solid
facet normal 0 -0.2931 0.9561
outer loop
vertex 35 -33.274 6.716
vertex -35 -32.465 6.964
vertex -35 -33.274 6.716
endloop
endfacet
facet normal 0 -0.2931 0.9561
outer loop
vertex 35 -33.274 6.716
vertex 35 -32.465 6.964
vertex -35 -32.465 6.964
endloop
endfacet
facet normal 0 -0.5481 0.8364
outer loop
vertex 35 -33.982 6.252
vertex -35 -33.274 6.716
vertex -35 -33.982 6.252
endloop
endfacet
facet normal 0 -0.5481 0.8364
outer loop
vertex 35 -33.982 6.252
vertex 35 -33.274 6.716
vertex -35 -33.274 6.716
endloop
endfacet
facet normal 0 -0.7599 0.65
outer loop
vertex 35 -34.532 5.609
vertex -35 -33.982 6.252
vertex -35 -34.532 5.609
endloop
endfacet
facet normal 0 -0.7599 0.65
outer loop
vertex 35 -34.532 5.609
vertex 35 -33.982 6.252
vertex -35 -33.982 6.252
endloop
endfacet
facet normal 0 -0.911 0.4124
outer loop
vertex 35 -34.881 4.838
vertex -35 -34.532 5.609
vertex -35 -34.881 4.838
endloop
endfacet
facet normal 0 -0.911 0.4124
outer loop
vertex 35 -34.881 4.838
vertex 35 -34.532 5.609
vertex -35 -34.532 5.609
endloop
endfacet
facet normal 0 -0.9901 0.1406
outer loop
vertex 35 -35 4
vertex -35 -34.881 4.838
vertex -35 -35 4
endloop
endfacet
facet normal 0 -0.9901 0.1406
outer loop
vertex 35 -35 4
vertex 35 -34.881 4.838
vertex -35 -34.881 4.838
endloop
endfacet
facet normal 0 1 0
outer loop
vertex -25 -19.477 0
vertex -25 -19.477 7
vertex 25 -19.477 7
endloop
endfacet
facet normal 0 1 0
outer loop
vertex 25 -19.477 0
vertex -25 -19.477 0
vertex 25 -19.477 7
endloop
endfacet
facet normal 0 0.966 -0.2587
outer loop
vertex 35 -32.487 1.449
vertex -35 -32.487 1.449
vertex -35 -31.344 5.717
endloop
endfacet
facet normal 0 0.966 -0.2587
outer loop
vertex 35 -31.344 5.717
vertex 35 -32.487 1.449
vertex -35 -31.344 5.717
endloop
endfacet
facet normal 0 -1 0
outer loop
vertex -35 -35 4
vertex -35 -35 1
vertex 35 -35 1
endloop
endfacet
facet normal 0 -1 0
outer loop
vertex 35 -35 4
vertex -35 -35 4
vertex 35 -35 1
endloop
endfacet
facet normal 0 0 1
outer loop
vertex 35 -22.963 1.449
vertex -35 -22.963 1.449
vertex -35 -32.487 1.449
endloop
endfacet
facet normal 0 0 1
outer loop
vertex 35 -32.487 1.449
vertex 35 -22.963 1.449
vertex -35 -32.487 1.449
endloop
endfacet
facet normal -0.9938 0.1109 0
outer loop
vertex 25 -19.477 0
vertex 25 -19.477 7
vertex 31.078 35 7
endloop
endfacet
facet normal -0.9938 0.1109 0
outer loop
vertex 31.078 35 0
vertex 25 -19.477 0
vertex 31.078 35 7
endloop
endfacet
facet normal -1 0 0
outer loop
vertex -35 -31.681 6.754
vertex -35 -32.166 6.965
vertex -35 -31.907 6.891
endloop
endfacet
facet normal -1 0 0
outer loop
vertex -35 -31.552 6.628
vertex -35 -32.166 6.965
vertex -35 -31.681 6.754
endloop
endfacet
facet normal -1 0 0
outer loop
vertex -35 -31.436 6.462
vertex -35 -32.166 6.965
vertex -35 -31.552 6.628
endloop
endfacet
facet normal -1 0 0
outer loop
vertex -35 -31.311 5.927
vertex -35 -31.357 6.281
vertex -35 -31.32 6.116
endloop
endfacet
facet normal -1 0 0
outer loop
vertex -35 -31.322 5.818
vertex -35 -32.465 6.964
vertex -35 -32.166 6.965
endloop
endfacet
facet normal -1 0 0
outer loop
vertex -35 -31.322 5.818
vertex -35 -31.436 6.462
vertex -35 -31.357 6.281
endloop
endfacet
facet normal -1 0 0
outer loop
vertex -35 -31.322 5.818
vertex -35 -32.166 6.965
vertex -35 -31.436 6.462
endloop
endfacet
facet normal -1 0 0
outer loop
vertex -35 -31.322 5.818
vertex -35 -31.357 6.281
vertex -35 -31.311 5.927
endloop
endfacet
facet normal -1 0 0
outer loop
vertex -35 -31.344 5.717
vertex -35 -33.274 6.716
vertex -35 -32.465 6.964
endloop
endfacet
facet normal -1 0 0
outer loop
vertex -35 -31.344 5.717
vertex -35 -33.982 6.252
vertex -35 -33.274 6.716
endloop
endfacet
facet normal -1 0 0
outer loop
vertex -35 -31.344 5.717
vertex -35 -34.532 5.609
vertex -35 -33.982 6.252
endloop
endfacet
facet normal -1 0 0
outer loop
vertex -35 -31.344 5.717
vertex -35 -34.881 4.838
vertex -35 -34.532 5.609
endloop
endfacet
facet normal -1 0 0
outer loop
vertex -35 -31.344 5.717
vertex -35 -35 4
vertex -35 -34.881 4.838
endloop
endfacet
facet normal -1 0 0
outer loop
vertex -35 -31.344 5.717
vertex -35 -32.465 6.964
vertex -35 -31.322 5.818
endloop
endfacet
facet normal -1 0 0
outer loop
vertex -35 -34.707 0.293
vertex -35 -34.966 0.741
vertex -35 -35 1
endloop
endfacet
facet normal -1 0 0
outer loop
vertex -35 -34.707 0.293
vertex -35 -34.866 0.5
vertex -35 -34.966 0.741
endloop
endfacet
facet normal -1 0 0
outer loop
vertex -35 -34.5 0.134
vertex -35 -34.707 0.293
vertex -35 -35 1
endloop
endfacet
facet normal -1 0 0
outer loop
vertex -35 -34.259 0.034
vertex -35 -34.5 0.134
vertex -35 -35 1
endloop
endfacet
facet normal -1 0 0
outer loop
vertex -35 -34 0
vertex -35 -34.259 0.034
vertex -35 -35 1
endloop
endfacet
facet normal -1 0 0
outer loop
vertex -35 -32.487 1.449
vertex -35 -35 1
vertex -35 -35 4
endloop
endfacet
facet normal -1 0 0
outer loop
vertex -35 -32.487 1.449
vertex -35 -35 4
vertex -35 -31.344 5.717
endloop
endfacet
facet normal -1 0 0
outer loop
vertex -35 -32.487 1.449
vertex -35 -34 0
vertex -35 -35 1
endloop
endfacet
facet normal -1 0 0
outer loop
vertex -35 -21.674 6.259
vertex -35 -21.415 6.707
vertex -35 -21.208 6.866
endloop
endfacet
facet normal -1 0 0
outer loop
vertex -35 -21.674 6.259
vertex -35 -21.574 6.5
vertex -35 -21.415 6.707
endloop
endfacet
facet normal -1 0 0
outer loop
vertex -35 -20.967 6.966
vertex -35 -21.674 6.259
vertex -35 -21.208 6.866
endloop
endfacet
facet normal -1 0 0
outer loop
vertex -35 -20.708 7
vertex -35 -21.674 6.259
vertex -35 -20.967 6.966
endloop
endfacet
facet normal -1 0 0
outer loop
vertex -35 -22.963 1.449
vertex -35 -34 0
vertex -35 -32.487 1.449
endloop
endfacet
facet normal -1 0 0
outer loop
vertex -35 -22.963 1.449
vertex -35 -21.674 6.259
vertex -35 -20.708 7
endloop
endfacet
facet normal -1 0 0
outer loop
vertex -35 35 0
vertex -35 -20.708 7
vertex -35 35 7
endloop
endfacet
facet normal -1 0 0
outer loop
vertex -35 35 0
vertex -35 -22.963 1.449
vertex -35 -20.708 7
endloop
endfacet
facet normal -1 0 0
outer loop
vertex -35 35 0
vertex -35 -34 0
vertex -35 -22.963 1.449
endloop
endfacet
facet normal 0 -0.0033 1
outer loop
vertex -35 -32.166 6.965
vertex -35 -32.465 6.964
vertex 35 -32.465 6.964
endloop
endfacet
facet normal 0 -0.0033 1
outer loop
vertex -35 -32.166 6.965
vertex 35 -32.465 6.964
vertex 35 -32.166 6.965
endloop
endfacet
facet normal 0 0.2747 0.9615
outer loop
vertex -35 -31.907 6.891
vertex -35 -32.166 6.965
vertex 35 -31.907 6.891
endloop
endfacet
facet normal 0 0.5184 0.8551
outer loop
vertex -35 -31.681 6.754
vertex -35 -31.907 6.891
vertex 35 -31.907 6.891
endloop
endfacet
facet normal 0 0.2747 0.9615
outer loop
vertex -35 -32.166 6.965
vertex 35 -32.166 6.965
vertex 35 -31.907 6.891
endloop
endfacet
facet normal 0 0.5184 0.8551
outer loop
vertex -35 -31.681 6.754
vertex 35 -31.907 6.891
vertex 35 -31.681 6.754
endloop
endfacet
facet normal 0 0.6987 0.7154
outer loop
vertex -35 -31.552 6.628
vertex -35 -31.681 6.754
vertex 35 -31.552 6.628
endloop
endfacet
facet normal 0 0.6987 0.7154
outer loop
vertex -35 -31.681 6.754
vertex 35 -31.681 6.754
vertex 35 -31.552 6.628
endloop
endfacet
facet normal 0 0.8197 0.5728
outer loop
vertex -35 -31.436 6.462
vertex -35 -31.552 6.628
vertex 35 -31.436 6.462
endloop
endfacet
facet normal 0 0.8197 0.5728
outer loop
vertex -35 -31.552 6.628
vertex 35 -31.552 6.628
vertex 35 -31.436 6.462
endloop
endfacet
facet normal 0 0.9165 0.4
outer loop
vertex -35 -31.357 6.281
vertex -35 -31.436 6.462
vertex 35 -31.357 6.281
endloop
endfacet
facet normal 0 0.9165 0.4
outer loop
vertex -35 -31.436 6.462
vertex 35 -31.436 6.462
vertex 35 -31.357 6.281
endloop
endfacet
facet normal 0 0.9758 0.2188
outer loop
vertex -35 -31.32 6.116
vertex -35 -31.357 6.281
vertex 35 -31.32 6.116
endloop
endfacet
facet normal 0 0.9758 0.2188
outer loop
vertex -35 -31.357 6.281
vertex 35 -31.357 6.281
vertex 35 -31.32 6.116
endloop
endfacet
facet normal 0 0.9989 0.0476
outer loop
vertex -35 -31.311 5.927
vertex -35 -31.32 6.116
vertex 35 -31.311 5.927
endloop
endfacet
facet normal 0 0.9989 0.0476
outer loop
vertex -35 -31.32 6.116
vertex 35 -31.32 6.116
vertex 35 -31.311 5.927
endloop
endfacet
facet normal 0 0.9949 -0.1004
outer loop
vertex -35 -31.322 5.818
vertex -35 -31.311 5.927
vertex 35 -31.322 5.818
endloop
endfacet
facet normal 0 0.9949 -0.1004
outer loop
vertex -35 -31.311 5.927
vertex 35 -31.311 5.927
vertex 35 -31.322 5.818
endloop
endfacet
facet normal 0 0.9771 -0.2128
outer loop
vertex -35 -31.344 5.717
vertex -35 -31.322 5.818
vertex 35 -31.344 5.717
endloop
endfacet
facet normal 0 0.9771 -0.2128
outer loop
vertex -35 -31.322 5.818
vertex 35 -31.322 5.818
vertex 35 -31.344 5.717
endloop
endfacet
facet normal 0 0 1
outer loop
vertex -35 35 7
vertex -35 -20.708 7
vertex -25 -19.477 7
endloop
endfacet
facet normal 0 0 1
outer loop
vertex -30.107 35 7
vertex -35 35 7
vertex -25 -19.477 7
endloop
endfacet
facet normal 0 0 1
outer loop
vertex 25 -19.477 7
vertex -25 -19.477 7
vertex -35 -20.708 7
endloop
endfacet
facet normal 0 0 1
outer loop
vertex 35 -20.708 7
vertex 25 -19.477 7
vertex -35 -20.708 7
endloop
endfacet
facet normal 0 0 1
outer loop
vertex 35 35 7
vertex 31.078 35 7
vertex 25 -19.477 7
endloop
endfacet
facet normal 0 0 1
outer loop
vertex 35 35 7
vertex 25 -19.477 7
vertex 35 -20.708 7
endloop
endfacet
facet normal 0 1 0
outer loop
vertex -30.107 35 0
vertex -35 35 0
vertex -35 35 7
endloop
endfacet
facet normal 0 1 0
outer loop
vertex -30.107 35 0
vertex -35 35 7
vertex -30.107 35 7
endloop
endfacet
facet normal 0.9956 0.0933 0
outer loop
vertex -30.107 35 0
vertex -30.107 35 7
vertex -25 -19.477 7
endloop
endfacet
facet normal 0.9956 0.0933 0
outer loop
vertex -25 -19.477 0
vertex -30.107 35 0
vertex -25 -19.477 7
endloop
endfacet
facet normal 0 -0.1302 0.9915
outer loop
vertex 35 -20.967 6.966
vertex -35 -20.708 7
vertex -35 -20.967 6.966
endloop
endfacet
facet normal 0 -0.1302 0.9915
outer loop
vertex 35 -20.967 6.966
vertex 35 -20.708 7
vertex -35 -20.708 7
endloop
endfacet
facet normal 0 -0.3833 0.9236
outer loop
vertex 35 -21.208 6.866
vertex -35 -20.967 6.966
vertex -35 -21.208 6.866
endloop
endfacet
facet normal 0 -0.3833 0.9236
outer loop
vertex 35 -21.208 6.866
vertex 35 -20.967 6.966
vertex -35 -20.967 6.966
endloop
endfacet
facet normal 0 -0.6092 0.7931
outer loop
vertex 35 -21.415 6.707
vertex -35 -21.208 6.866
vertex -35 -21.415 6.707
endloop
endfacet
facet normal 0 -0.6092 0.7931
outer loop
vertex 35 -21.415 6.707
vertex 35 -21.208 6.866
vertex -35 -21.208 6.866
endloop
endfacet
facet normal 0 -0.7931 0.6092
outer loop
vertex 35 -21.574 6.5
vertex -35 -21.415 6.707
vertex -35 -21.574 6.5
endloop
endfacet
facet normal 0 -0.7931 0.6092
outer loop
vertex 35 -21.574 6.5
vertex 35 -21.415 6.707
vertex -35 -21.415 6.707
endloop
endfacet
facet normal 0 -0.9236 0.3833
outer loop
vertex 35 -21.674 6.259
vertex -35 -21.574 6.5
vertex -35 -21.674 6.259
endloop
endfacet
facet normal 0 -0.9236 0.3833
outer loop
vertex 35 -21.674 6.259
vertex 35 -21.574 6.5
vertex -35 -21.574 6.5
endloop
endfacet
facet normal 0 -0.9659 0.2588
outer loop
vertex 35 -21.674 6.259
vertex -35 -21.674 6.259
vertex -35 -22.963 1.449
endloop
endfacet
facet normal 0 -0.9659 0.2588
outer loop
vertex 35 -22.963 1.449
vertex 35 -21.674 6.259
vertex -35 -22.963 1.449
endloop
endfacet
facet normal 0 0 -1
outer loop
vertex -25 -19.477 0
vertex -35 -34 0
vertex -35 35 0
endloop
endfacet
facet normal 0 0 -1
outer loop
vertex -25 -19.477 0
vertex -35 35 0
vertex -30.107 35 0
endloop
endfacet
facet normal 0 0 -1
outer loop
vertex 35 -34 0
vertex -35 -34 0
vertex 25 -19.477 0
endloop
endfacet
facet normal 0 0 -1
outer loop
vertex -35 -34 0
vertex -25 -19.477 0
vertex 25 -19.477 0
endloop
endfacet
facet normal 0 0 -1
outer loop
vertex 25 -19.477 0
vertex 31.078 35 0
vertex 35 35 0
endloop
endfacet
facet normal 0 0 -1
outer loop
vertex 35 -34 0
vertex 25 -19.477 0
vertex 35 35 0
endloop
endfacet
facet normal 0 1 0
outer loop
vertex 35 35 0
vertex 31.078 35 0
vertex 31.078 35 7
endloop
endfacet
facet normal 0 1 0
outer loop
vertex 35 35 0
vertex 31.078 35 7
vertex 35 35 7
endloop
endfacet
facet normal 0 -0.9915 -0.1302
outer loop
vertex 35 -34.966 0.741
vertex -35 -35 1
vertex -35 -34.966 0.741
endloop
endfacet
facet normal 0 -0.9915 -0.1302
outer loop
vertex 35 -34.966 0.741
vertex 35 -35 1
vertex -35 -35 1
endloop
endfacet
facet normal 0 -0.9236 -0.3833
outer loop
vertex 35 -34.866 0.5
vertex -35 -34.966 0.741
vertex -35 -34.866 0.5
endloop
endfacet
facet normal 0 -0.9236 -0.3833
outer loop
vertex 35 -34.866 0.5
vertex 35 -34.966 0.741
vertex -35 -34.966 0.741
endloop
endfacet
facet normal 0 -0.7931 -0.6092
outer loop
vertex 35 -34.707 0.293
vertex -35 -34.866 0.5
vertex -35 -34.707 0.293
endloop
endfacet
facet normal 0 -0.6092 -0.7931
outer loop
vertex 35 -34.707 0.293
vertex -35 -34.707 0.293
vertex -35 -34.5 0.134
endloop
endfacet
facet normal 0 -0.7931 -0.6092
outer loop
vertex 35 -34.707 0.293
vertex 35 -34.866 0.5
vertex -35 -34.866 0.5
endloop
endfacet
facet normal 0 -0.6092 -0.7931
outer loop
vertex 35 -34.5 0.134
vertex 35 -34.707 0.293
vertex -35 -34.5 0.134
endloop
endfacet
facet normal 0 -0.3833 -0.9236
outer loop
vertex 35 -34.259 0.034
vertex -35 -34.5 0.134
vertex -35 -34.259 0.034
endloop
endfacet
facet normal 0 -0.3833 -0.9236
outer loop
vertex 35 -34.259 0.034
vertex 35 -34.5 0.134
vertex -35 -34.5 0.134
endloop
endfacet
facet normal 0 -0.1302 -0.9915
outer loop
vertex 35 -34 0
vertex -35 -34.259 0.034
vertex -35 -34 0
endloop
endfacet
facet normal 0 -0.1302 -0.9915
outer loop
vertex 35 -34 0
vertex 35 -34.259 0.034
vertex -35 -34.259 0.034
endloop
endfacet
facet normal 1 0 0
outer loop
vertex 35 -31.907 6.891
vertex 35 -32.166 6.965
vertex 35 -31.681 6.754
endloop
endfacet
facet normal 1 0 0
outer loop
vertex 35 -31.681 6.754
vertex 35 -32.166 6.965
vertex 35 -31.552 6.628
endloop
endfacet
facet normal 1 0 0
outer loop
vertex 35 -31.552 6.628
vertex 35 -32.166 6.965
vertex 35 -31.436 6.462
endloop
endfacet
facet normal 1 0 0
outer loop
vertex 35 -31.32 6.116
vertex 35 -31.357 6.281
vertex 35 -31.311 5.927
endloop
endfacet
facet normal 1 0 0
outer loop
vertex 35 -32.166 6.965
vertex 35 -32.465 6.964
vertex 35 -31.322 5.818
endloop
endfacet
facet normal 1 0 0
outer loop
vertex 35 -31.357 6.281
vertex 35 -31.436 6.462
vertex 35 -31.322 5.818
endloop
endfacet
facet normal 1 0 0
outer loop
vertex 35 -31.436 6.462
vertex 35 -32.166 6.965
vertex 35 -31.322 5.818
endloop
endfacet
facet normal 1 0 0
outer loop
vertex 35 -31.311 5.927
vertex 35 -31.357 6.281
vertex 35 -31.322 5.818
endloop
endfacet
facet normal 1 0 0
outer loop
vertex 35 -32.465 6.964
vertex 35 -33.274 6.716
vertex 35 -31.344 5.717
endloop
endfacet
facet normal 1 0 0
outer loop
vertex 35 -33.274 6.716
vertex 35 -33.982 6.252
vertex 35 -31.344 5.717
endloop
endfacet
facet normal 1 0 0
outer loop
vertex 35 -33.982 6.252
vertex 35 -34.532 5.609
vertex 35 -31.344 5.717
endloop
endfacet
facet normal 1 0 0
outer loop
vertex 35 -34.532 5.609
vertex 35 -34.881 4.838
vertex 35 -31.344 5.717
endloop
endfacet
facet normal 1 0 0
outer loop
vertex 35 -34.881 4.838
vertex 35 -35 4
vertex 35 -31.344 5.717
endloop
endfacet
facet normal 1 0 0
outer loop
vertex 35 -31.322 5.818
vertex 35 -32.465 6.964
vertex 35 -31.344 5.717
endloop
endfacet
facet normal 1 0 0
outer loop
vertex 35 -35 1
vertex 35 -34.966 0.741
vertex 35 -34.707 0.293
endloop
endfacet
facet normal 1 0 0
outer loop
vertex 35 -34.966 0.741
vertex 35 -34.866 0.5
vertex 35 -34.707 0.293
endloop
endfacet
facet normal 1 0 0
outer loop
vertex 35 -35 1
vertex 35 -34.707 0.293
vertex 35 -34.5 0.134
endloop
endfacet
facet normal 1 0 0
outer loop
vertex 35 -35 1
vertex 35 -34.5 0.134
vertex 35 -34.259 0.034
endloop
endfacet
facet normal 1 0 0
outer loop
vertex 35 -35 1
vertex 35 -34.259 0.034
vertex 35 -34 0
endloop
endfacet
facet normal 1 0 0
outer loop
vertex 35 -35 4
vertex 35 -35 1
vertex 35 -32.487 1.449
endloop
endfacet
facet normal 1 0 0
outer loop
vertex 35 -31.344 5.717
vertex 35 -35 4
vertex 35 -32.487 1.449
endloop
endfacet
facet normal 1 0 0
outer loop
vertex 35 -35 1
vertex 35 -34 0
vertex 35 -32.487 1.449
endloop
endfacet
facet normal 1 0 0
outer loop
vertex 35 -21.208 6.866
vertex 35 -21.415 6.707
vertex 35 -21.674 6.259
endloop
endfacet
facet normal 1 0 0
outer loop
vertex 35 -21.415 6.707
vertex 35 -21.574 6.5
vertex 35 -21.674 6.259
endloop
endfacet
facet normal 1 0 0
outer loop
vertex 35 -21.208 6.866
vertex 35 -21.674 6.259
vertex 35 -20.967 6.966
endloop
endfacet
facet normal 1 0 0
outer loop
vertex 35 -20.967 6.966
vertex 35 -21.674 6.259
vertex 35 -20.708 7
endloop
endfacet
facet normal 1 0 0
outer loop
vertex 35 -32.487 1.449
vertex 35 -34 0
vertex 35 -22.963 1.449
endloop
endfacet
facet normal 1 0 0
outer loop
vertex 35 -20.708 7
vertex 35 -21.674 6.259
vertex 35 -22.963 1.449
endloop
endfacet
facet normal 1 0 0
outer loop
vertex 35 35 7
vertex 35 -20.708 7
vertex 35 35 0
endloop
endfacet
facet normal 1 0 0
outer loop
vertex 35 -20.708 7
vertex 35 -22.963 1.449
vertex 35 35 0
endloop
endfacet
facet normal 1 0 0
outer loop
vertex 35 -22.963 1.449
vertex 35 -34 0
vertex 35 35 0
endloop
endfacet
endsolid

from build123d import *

# Parameters (mm, degrees)
F0_W     = 70
F0_H     = 70
F1_DEPTH = 7
F3_DEPTH = 70
F4_R     = 3
F5_R     = 1
F6_R     = 1
F8_DEPTH = 7


with BuildPart() as f1:
    # F0 (on Top) → F1 (new body)
    with BuildSketch(Plane.XY):
        Rectangle(F0_W, F0_H)
    extrude(amount=F1_DEPTH)

    # F2 (on face) → F3 (cut, through all)
    with BuildSketch(Plane(origin=(-35, 0, 0), x_dir=(0, -1, 0), z_dir=(-1, 0, 0))):
        Polygon((31, 7), (21.4754591402, 7), (22.9629022167, 1.4487868654), (32.4874430764, 1.4487868654), align=None)
    extrude(amount=-F3_DEPTH, mode=Mode.SUBTRACT)

    # F4
    f4_edges = [f1.edges().sort_by_distance(p)[0] for p in [
        (0, -35, 7),
    ]]
    fillet(f4_edges, radius=F4_R)

    # F5
    f5_edges = [f1.edges().sort_by_distance(p)[0] for p in [
        (0, -35, 0),
    ]]
    fillet(f5_edges, radius=F5_R)

    # F6
    f6_edges = [f1.edges().sort_by_distance(p)[0] for p in [
        (0, -21.475459, 7),
        (0, -31, 7),
    ]]
    fillet(f6_edges, radius=F6_R)

    # F7 (on face) → F8 (cut, through all)
    with BuildSketch(Plane.XY.offset(7)):
        Polygon((-25, -19.4765049964), (25, -19.4765049964), (31.0781002045, 35), (26.0781002045, 35), (-25.1070436835, 35), (-30.1070436835, 35), align=None)
    extrude(amount=-F8_DEPTH, mode=Mode.SUBTRACT)


solid = f1.part
